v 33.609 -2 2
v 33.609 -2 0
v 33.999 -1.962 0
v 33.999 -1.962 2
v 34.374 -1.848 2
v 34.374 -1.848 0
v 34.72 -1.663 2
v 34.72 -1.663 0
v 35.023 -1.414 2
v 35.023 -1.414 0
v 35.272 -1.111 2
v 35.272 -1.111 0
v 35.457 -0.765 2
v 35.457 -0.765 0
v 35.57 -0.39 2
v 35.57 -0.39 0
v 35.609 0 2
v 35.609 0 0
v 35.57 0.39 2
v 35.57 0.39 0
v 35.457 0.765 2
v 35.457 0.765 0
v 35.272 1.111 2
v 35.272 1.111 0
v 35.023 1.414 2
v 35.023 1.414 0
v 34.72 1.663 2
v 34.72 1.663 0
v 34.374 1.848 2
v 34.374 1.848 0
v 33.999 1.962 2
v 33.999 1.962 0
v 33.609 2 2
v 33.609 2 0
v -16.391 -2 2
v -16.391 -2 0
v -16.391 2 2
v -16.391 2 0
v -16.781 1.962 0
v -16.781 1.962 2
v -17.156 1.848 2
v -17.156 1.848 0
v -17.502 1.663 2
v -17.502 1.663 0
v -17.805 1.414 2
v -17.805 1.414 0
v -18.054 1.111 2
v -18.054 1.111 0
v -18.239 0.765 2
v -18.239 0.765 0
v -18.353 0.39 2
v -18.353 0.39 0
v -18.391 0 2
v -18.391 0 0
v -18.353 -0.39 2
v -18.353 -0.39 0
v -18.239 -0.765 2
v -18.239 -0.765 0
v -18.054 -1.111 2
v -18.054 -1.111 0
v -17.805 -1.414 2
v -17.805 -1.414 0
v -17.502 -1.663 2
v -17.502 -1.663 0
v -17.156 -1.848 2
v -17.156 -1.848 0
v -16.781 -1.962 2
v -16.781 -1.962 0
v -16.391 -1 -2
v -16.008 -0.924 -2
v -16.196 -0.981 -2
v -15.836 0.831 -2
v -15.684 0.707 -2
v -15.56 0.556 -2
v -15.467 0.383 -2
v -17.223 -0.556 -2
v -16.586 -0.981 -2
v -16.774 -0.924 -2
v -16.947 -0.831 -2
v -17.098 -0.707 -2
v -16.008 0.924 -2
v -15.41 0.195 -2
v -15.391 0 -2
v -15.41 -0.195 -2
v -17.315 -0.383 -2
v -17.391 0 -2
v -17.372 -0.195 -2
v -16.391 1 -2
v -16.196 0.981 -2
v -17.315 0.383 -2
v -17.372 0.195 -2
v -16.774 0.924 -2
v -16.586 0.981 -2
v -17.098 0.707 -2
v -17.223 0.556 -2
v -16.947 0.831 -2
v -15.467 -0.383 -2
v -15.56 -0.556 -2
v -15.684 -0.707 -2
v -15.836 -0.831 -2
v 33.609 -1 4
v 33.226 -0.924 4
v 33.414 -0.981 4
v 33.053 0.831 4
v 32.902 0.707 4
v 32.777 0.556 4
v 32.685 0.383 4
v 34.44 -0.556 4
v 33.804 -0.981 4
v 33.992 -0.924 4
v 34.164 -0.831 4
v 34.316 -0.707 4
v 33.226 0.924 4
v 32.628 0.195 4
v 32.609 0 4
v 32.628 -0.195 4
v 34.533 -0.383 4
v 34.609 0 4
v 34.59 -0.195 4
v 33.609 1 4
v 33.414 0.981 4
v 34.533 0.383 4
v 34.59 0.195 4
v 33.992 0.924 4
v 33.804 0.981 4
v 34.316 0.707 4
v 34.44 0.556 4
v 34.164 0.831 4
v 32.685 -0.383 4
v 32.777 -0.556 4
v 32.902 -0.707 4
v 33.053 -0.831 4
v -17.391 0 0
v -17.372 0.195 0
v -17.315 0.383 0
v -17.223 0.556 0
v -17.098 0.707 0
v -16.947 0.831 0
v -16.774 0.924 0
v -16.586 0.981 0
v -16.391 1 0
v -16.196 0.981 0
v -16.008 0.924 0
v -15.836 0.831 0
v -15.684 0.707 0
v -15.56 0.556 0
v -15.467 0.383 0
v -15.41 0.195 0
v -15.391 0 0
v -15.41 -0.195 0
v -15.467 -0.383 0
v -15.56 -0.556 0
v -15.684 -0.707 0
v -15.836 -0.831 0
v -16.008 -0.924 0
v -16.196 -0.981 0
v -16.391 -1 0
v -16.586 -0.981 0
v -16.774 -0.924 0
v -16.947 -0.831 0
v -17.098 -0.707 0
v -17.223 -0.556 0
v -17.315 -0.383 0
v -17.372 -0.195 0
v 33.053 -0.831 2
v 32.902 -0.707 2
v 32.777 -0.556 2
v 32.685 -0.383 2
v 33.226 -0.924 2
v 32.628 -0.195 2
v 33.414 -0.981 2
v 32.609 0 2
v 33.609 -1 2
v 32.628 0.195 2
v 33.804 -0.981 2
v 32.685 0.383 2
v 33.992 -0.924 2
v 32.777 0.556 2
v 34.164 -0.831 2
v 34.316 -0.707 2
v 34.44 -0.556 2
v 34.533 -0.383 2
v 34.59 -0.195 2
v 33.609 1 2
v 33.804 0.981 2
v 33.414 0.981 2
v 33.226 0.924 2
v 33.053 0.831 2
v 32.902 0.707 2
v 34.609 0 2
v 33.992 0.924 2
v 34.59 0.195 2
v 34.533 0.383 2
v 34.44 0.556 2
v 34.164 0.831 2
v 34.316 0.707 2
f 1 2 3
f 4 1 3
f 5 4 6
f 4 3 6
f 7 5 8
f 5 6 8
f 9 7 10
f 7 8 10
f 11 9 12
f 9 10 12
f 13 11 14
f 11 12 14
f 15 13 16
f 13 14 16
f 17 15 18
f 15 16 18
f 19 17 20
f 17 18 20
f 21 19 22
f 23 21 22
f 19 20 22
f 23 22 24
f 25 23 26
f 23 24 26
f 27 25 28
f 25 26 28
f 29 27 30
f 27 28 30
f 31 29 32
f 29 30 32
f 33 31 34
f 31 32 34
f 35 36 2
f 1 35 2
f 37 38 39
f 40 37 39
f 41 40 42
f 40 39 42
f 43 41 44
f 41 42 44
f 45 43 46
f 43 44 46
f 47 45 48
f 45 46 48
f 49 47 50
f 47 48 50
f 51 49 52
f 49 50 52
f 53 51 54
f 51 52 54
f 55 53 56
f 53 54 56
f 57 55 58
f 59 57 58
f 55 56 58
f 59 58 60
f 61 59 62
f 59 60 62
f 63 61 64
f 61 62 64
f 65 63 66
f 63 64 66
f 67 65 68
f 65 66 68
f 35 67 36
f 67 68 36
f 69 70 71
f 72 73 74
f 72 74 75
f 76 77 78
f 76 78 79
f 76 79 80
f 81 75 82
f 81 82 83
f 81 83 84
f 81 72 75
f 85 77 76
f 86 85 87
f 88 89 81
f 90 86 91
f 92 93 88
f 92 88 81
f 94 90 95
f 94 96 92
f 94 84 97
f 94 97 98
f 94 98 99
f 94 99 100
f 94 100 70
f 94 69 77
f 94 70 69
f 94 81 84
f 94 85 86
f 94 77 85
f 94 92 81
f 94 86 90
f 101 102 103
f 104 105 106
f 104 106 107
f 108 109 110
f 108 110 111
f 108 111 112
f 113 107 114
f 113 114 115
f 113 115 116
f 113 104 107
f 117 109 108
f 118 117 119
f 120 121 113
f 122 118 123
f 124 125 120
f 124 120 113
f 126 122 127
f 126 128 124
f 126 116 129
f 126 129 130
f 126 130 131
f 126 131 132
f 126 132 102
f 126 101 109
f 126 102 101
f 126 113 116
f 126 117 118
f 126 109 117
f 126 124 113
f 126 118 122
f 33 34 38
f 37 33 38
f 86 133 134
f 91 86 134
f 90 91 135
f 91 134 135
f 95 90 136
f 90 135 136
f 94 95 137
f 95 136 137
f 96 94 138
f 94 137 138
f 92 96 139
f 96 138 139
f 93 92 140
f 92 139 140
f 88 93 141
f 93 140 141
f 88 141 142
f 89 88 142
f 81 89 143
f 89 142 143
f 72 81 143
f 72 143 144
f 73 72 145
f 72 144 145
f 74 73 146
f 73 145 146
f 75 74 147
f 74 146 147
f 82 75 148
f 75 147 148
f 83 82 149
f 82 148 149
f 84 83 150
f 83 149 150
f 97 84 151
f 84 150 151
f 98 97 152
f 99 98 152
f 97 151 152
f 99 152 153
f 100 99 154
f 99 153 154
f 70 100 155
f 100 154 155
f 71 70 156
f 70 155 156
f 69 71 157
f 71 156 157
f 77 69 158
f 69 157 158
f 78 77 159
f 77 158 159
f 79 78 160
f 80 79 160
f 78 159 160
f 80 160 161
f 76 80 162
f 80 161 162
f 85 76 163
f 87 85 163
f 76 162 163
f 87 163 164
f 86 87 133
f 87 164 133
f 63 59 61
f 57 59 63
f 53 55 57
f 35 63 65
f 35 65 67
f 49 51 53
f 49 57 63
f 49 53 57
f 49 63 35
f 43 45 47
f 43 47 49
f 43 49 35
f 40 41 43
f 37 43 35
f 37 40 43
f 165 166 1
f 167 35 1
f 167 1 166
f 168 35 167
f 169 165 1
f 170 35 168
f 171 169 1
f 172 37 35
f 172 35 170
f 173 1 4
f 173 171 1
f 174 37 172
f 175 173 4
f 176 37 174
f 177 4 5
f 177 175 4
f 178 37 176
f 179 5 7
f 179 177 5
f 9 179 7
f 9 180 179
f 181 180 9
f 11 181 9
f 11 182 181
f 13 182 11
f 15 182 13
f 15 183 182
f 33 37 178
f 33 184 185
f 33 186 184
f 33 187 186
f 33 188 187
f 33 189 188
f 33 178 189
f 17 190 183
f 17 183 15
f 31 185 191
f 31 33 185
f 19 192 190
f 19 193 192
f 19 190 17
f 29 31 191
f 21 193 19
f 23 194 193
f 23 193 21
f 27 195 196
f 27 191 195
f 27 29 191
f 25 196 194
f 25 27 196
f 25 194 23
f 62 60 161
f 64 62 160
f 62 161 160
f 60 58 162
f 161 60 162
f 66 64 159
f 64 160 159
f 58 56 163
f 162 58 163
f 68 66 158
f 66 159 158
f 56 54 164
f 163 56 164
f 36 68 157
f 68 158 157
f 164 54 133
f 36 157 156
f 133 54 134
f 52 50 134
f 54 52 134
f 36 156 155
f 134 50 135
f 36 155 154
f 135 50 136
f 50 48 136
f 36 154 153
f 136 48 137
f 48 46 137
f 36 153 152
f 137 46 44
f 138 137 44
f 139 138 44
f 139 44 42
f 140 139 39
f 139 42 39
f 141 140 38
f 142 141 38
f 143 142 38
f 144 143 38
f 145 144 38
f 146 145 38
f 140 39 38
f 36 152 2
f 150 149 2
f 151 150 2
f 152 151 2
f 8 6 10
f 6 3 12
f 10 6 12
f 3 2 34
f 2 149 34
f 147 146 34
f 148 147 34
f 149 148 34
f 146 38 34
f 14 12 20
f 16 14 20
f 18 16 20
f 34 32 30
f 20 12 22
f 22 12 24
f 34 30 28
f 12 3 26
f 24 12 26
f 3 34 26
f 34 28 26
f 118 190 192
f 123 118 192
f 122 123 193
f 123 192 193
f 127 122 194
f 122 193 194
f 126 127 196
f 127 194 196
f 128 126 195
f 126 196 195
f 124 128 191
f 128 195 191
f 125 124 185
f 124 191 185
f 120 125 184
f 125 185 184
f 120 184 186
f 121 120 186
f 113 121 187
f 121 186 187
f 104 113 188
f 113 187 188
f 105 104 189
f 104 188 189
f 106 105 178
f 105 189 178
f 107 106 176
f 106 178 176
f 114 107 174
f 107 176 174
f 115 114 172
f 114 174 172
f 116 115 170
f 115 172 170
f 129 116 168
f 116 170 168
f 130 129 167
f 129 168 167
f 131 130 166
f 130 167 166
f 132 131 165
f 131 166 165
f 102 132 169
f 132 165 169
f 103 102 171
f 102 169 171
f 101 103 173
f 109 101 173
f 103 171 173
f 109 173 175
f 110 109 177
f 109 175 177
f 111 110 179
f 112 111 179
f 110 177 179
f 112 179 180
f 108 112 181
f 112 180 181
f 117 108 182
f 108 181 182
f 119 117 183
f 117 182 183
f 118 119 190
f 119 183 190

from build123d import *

# Parameters (mm, degrees)
EXTRUDE_1_DEPTH = 2
SKETCH_2_R      = 1
EXTRUDE_2_DEPTH = 2
SKETCH_3_R      = 1
EXTRUDE_3_DEPTH = 2


with BuildPart() as part:
    # 草图1 → 凸台-拉伸1 (new body)
    with BuildSketch(Plane.XY):
        with BuildLine():
            Line((-16.391109626, -2), (33.608890374, -2))
            ThreePointArc((33.608890374, -2), (35.608890374, 0), (33.608890374, 2))
            Line((33.608890374, 2), (-16.391109626, 2))
            ThreePointArc((-16.391109626, 2), (-18.391109626, 0), (-16.391109626, -2))
        make_face()
    extrude(amount=EXTRUDE_1_DEPTH)

    # 草图2 → 凸台-拉伸2 (add)
    with BuildSketch(Plane.XY.offset(2)):
        with Locations((33.608890374, 0)):
            Circle(SKETCH_2_R)
    extrude(amount=EXTRUDE_2_DEPTH)

    # 草图3 → 凸台-拉伸3 (add)
    with BuildSketch(Plane(origin=(0, 0, 0), x_dir=(-1, 0, 0), z_dir=(0, 0, -1))):
        with Locations((16.391109626, 0)):
            Circle(SKETCH_3_R)
    extrude(amount=EXTRUDE_3_DEPTH)


solid = part.part
